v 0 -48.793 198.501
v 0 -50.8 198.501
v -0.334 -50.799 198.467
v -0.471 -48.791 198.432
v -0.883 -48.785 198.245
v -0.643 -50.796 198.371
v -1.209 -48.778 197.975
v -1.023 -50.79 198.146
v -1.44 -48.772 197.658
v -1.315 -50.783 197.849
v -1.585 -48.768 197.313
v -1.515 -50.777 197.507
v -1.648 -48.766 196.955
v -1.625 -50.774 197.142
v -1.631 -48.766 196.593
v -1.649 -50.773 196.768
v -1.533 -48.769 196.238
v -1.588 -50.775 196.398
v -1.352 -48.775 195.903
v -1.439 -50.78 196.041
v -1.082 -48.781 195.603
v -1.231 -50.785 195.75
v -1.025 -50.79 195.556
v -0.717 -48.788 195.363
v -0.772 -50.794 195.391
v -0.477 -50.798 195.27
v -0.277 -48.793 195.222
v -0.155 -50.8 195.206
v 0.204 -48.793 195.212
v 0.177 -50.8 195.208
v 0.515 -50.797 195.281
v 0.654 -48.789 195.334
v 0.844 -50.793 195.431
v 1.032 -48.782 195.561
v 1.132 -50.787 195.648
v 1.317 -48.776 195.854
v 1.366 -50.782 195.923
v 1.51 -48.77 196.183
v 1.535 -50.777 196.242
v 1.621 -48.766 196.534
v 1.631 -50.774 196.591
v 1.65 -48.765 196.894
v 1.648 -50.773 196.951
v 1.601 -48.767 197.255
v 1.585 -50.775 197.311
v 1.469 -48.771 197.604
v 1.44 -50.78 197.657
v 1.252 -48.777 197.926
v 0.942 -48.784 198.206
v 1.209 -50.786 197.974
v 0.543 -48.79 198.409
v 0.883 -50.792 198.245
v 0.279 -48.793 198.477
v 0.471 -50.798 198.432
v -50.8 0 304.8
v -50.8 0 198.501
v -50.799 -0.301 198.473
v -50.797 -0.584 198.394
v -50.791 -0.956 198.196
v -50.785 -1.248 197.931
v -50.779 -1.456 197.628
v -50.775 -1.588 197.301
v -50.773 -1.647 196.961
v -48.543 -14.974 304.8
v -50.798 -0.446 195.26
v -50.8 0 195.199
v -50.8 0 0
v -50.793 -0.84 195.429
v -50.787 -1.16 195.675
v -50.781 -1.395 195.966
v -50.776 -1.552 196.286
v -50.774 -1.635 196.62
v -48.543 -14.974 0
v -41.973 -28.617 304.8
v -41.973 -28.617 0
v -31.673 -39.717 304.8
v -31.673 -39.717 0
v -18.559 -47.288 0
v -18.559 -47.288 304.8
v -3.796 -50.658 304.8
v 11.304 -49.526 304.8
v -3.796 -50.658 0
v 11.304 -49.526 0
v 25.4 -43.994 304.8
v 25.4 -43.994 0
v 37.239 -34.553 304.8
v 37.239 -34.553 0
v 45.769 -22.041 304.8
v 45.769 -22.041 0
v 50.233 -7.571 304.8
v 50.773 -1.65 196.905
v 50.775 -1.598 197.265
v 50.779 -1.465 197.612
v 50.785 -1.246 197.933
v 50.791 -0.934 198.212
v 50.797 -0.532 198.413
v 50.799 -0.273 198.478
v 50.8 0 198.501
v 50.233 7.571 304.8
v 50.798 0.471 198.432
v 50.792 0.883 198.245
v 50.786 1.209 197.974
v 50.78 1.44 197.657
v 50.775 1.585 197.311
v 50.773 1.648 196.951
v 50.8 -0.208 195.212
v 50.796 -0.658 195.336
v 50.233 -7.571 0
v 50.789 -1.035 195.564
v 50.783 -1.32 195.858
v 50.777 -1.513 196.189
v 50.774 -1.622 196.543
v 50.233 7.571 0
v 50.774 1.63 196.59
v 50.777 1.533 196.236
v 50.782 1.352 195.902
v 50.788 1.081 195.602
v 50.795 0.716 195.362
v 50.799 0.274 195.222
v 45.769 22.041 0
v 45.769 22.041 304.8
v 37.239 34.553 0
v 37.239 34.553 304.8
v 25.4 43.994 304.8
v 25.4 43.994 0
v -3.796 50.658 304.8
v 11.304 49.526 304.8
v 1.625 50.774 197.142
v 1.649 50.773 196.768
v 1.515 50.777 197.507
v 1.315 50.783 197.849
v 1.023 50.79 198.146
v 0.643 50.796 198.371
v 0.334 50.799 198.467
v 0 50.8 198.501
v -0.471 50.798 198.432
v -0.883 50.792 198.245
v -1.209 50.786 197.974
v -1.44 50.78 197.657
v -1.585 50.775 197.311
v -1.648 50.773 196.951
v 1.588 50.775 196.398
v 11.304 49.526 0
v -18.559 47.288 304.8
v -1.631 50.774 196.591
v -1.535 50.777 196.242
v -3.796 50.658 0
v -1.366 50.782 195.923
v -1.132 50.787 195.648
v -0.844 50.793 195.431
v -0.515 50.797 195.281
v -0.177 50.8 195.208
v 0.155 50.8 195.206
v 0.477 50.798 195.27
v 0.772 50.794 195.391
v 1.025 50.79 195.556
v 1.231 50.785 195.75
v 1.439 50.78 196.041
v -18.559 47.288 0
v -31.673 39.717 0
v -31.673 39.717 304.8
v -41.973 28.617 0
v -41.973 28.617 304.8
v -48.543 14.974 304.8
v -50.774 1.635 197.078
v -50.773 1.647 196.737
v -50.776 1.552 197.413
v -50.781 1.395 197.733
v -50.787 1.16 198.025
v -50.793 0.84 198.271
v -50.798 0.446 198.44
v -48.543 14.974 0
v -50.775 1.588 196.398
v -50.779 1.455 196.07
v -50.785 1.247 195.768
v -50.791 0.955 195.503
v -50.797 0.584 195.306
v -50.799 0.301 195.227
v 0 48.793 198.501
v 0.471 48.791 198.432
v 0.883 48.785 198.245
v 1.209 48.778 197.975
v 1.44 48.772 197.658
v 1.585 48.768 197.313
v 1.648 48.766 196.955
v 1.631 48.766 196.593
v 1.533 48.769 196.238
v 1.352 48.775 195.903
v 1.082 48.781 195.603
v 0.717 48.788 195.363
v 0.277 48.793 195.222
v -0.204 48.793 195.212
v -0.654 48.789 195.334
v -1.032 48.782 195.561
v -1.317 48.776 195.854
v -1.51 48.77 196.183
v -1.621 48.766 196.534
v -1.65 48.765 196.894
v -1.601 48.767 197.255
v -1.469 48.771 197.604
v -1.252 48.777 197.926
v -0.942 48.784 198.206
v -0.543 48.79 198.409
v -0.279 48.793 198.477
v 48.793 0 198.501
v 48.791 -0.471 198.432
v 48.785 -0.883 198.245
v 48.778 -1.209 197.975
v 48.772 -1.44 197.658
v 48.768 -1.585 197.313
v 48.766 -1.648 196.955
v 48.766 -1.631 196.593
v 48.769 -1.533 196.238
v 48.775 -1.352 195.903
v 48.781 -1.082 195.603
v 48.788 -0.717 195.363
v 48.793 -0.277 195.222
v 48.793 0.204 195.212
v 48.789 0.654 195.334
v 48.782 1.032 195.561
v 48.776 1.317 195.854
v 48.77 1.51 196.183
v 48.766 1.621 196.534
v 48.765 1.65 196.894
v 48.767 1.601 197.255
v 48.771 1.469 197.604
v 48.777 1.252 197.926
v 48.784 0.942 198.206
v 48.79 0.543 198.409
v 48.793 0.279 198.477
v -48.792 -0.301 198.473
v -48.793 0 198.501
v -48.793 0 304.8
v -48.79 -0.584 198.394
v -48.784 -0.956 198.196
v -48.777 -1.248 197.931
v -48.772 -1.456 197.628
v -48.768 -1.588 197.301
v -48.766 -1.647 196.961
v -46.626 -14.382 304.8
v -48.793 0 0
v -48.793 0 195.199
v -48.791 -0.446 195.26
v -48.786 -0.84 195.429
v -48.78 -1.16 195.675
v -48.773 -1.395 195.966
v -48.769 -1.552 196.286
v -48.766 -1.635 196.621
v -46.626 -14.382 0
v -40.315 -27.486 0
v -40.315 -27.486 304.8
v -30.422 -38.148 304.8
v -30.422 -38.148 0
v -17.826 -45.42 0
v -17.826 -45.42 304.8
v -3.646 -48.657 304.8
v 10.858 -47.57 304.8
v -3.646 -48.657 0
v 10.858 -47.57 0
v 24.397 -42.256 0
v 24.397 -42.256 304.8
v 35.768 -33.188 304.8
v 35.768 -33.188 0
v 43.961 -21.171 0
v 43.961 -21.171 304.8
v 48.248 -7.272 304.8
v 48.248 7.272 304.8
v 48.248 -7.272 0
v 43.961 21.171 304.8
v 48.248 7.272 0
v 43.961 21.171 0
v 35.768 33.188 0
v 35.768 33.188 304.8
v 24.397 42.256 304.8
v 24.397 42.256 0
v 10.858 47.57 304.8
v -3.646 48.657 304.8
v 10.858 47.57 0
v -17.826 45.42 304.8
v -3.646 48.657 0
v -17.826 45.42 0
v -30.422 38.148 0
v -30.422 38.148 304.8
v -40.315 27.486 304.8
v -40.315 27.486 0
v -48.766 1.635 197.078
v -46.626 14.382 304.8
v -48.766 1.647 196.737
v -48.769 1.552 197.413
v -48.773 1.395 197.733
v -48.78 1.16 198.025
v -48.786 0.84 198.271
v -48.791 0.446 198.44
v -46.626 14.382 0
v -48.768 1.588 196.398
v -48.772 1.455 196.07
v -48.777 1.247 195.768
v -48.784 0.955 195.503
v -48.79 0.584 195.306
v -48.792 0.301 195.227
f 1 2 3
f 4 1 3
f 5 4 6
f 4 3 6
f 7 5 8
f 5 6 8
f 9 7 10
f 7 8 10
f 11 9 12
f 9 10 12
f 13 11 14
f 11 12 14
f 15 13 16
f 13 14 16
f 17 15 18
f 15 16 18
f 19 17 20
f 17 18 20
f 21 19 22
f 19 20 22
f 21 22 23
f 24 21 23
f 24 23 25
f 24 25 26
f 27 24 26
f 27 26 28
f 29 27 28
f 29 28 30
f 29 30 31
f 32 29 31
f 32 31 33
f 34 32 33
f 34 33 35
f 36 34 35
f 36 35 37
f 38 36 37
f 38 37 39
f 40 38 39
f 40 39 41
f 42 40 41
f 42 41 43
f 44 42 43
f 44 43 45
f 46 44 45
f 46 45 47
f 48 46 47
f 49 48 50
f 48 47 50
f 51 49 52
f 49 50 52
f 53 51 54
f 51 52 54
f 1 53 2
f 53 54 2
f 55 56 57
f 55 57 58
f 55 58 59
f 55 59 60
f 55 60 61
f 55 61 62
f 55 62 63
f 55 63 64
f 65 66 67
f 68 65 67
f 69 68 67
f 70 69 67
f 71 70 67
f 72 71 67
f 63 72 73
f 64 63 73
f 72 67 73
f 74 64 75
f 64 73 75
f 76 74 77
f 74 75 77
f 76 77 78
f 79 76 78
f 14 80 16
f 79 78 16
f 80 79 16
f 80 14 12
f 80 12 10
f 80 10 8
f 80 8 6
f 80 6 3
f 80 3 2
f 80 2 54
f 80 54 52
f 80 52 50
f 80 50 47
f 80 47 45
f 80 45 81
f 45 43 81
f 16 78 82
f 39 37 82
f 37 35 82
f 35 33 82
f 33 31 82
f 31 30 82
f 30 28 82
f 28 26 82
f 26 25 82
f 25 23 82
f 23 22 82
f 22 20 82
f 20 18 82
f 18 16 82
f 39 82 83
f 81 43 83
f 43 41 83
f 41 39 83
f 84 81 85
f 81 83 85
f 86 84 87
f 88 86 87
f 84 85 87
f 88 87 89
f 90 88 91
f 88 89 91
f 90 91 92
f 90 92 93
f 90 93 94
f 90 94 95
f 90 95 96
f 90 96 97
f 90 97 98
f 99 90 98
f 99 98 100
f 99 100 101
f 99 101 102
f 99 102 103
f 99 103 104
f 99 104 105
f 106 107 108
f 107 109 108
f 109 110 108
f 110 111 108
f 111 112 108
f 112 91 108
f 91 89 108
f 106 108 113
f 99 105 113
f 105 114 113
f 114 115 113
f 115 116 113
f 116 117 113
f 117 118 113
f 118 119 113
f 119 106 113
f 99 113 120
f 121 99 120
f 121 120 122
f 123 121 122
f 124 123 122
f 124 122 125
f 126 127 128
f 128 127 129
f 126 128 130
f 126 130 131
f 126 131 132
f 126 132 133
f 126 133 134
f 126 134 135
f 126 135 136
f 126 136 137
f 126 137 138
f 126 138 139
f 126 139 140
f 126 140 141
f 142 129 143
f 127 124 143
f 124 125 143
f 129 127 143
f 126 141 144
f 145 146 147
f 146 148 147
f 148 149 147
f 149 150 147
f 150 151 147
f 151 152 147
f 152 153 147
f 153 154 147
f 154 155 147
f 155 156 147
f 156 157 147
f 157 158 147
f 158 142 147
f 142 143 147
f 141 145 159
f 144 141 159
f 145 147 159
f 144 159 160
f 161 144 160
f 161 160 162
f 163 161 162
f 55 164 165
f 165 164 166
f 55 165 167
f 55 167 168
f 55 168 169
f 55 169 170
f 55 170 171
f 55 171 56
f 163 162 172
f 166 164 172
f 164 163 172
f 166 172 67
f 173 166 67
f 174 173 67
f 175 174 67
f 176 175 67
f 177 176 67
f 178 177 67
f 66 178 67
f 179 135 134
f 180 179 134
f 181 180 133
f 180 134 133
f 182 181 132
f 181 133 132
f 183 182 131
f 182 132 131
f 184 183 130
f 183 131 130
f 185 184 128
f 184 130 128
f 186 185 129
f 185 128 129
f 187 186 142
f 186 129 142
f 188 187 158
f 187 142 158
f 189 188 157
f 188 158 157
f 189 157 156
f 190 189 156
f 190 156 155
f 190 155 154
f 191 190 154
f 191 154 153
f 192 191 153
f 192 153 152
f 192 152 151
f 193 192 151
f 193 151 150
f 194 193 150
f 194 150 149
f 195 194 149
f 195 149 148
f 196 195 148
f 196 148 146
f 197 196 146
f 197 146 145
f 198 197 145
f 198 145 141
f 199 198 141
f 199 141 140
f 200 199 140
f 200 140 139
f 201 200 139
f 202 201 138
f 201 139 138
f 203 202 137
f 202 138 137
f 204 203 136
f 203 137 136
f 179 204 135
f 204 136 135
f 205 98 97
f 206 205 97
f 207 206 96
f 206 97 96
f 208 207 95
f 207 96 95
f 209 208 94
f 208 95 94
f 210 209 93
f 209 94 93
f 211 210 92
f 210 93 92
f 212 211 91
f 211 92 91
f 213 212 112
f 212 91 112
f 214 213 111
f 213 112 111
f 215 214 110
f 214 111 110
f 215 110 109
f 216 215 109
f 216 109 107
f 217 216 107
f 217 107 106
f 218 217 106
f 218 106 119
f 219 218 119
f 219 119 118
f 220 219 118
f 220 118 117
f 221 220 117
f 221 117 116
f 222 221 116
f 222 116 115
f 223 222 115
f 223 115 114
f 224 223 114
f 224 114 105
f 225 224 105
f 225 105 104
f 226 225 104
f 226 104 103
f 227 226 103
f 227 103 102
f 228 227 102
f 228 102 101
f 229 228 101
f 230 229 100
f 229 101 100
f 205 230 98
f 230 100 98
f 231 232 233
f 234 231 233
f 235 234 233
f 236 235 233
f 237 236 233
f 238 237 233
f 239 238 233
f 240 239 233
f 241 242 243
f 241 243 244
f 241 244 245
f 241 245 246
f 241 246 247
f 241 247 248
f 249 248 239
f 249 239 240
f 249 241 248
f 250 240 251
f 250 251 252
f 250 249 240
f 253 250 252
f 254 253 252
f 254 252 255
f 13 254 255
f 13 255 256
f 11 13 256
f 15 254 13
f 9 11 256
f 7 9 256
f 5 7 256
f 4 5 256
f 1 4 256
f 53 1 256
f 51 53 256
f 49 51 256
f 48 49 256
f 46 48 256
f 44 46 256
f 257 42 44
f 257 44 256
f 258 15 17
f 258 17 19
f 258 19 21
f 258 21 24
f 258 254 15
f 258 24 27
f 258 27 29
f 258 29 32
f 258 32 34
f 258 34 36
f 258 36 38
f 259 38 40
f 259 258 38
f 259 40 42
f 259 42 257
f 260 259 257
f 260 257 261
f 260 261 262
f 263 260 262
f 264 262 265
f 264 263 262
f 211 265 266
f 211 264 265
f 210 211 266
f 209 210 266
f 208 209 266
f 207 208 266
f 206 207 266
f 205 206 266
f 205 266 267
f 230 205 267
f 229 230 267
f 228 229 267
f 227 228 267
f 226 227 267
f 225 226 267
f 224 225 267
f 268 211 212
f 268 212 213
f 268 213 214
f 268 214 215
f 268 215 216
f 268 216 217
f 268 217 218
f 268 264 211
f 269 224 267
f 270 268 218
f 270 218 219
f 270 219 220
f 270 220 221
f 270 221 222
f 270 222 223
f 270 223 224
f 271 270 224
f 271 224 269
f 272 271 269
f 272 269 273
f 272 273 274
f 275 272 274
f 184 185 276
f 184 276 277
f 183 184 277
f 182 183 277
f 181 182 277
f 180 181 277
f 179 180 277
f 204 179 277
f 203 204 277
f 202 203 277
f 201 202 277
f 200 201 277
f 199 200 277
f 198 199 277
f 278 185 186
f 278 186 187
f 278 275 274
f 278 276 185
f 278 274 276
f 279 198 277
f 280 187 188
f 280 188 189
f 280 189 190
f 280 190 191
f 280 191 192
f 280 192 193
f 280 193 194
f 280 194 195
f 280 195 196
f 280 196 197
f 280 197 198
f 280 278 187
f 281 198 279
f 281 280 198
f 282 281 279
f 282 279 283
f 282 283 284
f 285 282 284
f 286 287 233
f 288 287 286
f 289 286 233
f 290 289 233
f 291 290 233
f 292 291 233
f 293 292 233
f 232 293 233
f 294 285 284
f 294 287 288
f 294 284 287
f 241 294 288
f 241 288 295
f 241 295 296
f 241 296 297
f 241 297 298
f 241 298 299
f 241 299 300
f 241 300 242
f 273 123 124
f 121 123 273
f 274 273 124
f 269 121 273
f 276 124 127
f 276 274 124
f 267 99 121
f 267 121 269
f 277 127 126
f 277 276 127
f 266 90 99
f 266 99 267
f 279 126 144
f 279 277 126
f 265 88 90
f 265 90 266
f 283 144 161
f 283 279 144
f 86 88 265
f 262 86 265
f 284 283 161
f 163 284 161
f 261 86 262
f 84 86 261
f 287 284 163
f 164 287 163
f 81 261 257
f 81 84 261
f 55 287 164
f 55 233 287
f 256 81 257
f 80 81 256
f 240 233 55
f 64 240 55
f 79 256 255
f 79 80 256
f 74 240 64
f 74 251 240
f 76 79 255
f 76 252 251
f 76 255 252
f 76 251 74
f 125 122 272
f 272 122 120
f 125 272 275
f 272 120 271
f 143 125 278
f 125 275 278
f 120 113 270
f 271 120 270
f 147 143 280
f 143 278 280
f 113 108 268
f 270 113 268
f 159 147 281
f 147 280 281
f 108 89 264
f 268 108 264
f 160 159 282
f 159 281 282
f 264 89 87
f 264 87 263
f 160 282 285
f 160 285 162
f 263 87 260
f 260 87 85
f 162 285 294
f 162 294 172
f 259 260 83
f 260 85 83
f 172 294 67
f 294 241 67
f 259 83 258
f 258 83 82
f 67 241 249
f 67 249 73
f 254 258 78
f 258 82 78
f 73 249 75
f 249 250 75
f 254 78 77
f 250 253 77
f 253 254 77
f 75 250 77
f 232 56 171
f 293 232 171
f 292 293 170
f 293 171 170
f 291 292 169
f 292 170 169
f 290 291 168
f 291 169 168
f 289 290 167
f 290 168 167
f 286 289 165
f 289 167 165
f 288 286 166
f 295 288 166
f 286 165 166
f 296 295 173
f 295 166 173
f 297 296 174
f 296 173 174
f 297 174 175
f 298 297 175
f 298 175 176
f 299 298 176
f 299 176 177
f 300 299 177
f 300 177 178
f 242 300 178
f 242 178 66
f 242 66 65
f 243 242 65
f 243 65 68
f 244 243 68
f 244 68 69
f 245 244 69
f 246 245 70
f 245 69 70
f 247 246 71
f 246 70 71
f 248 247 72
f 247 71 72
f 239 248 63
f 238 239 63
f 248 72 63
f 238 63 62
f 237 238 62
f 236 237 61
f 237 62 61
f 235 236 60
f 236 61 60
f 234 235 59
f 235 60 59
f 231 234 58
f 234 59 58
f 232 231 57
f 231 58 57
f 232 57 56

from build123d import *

# Parameters (mm, degrees)
SKETCH1_R               = 50.8
SKETCH1_R_2             = 48.7934
BOSS_EXTRUDE1_DEPTH     = 304.8
CUT_EXTRUDE1_REACH      = 327.279
CUT_EXTRUDE1_END_RADIUS = 48.7934
SKETCH2_R               = 1.651
CIRPATTERN1_COUNT       = 4


with BuildPart() as part:
    # Sketch1 → Boss-Extrude1 (new body)
    with BuildSketch(Plane.XY):
        with Locations(Location((0, 0, 0), (0, 0, 180))):
            Circle(SKETCH1_R)
        with Locations(Location((0, 0, 0), (0, 0, 180))):
            Circle(SKETCH1_R_2, mode=Mode.SUBTRACT)
    extrude(amount=BOSS_EXTRUDE1_DEPTH)

    # Cut-Extrude1: up to this cylinder (the profile starts outside it)
    cut_extrude1_end = Plane(origin=(0, 0, 196.85), z_dir=(0, 0, -1)) * Cylinder(CUT_EXTRUDE1_END_RADIUS, 753.1448, mode=Mode.PRIVATE)
    # Sketch2 → Cut-Extrude1 (cut, up to the surface)
    with BuildSketch(Plane.ZY.offset(50.8), mode=Mode.PRIVATE) as cut_extrude1_sk1:
        with Locations((196.85, 0)):
            Circle(SKETCH2_R)
    cut_extrude1_tool1 = extrude(cut_extrude1_sk1.sketch, amount=-CUT_EXTRUDE1_REACH, mode=Mode.PRIVATE) - cut_extrude1_end
    cut_extrude1 = cut_extrude1_tool1.solids().sort_by_distance((-50.8, 0, 196.85))[0]
    add(cut_extrude1, mode=Mode.SUBTRACT)

    # CirPattern1: Cut-Extrude1 ×4 about axis
    cirpattern1_axis = Axis((0, 0, 304.8), (0, 0, -1))
    for i in range(1, CIRPATTERN1_COUNT):
        add(cut_extrude1.rotate(cirpattern1_axis, i * 360 / CIRPATTERN1_COUNT), mode=Mode.SUBTRACT)


solid = part.part
